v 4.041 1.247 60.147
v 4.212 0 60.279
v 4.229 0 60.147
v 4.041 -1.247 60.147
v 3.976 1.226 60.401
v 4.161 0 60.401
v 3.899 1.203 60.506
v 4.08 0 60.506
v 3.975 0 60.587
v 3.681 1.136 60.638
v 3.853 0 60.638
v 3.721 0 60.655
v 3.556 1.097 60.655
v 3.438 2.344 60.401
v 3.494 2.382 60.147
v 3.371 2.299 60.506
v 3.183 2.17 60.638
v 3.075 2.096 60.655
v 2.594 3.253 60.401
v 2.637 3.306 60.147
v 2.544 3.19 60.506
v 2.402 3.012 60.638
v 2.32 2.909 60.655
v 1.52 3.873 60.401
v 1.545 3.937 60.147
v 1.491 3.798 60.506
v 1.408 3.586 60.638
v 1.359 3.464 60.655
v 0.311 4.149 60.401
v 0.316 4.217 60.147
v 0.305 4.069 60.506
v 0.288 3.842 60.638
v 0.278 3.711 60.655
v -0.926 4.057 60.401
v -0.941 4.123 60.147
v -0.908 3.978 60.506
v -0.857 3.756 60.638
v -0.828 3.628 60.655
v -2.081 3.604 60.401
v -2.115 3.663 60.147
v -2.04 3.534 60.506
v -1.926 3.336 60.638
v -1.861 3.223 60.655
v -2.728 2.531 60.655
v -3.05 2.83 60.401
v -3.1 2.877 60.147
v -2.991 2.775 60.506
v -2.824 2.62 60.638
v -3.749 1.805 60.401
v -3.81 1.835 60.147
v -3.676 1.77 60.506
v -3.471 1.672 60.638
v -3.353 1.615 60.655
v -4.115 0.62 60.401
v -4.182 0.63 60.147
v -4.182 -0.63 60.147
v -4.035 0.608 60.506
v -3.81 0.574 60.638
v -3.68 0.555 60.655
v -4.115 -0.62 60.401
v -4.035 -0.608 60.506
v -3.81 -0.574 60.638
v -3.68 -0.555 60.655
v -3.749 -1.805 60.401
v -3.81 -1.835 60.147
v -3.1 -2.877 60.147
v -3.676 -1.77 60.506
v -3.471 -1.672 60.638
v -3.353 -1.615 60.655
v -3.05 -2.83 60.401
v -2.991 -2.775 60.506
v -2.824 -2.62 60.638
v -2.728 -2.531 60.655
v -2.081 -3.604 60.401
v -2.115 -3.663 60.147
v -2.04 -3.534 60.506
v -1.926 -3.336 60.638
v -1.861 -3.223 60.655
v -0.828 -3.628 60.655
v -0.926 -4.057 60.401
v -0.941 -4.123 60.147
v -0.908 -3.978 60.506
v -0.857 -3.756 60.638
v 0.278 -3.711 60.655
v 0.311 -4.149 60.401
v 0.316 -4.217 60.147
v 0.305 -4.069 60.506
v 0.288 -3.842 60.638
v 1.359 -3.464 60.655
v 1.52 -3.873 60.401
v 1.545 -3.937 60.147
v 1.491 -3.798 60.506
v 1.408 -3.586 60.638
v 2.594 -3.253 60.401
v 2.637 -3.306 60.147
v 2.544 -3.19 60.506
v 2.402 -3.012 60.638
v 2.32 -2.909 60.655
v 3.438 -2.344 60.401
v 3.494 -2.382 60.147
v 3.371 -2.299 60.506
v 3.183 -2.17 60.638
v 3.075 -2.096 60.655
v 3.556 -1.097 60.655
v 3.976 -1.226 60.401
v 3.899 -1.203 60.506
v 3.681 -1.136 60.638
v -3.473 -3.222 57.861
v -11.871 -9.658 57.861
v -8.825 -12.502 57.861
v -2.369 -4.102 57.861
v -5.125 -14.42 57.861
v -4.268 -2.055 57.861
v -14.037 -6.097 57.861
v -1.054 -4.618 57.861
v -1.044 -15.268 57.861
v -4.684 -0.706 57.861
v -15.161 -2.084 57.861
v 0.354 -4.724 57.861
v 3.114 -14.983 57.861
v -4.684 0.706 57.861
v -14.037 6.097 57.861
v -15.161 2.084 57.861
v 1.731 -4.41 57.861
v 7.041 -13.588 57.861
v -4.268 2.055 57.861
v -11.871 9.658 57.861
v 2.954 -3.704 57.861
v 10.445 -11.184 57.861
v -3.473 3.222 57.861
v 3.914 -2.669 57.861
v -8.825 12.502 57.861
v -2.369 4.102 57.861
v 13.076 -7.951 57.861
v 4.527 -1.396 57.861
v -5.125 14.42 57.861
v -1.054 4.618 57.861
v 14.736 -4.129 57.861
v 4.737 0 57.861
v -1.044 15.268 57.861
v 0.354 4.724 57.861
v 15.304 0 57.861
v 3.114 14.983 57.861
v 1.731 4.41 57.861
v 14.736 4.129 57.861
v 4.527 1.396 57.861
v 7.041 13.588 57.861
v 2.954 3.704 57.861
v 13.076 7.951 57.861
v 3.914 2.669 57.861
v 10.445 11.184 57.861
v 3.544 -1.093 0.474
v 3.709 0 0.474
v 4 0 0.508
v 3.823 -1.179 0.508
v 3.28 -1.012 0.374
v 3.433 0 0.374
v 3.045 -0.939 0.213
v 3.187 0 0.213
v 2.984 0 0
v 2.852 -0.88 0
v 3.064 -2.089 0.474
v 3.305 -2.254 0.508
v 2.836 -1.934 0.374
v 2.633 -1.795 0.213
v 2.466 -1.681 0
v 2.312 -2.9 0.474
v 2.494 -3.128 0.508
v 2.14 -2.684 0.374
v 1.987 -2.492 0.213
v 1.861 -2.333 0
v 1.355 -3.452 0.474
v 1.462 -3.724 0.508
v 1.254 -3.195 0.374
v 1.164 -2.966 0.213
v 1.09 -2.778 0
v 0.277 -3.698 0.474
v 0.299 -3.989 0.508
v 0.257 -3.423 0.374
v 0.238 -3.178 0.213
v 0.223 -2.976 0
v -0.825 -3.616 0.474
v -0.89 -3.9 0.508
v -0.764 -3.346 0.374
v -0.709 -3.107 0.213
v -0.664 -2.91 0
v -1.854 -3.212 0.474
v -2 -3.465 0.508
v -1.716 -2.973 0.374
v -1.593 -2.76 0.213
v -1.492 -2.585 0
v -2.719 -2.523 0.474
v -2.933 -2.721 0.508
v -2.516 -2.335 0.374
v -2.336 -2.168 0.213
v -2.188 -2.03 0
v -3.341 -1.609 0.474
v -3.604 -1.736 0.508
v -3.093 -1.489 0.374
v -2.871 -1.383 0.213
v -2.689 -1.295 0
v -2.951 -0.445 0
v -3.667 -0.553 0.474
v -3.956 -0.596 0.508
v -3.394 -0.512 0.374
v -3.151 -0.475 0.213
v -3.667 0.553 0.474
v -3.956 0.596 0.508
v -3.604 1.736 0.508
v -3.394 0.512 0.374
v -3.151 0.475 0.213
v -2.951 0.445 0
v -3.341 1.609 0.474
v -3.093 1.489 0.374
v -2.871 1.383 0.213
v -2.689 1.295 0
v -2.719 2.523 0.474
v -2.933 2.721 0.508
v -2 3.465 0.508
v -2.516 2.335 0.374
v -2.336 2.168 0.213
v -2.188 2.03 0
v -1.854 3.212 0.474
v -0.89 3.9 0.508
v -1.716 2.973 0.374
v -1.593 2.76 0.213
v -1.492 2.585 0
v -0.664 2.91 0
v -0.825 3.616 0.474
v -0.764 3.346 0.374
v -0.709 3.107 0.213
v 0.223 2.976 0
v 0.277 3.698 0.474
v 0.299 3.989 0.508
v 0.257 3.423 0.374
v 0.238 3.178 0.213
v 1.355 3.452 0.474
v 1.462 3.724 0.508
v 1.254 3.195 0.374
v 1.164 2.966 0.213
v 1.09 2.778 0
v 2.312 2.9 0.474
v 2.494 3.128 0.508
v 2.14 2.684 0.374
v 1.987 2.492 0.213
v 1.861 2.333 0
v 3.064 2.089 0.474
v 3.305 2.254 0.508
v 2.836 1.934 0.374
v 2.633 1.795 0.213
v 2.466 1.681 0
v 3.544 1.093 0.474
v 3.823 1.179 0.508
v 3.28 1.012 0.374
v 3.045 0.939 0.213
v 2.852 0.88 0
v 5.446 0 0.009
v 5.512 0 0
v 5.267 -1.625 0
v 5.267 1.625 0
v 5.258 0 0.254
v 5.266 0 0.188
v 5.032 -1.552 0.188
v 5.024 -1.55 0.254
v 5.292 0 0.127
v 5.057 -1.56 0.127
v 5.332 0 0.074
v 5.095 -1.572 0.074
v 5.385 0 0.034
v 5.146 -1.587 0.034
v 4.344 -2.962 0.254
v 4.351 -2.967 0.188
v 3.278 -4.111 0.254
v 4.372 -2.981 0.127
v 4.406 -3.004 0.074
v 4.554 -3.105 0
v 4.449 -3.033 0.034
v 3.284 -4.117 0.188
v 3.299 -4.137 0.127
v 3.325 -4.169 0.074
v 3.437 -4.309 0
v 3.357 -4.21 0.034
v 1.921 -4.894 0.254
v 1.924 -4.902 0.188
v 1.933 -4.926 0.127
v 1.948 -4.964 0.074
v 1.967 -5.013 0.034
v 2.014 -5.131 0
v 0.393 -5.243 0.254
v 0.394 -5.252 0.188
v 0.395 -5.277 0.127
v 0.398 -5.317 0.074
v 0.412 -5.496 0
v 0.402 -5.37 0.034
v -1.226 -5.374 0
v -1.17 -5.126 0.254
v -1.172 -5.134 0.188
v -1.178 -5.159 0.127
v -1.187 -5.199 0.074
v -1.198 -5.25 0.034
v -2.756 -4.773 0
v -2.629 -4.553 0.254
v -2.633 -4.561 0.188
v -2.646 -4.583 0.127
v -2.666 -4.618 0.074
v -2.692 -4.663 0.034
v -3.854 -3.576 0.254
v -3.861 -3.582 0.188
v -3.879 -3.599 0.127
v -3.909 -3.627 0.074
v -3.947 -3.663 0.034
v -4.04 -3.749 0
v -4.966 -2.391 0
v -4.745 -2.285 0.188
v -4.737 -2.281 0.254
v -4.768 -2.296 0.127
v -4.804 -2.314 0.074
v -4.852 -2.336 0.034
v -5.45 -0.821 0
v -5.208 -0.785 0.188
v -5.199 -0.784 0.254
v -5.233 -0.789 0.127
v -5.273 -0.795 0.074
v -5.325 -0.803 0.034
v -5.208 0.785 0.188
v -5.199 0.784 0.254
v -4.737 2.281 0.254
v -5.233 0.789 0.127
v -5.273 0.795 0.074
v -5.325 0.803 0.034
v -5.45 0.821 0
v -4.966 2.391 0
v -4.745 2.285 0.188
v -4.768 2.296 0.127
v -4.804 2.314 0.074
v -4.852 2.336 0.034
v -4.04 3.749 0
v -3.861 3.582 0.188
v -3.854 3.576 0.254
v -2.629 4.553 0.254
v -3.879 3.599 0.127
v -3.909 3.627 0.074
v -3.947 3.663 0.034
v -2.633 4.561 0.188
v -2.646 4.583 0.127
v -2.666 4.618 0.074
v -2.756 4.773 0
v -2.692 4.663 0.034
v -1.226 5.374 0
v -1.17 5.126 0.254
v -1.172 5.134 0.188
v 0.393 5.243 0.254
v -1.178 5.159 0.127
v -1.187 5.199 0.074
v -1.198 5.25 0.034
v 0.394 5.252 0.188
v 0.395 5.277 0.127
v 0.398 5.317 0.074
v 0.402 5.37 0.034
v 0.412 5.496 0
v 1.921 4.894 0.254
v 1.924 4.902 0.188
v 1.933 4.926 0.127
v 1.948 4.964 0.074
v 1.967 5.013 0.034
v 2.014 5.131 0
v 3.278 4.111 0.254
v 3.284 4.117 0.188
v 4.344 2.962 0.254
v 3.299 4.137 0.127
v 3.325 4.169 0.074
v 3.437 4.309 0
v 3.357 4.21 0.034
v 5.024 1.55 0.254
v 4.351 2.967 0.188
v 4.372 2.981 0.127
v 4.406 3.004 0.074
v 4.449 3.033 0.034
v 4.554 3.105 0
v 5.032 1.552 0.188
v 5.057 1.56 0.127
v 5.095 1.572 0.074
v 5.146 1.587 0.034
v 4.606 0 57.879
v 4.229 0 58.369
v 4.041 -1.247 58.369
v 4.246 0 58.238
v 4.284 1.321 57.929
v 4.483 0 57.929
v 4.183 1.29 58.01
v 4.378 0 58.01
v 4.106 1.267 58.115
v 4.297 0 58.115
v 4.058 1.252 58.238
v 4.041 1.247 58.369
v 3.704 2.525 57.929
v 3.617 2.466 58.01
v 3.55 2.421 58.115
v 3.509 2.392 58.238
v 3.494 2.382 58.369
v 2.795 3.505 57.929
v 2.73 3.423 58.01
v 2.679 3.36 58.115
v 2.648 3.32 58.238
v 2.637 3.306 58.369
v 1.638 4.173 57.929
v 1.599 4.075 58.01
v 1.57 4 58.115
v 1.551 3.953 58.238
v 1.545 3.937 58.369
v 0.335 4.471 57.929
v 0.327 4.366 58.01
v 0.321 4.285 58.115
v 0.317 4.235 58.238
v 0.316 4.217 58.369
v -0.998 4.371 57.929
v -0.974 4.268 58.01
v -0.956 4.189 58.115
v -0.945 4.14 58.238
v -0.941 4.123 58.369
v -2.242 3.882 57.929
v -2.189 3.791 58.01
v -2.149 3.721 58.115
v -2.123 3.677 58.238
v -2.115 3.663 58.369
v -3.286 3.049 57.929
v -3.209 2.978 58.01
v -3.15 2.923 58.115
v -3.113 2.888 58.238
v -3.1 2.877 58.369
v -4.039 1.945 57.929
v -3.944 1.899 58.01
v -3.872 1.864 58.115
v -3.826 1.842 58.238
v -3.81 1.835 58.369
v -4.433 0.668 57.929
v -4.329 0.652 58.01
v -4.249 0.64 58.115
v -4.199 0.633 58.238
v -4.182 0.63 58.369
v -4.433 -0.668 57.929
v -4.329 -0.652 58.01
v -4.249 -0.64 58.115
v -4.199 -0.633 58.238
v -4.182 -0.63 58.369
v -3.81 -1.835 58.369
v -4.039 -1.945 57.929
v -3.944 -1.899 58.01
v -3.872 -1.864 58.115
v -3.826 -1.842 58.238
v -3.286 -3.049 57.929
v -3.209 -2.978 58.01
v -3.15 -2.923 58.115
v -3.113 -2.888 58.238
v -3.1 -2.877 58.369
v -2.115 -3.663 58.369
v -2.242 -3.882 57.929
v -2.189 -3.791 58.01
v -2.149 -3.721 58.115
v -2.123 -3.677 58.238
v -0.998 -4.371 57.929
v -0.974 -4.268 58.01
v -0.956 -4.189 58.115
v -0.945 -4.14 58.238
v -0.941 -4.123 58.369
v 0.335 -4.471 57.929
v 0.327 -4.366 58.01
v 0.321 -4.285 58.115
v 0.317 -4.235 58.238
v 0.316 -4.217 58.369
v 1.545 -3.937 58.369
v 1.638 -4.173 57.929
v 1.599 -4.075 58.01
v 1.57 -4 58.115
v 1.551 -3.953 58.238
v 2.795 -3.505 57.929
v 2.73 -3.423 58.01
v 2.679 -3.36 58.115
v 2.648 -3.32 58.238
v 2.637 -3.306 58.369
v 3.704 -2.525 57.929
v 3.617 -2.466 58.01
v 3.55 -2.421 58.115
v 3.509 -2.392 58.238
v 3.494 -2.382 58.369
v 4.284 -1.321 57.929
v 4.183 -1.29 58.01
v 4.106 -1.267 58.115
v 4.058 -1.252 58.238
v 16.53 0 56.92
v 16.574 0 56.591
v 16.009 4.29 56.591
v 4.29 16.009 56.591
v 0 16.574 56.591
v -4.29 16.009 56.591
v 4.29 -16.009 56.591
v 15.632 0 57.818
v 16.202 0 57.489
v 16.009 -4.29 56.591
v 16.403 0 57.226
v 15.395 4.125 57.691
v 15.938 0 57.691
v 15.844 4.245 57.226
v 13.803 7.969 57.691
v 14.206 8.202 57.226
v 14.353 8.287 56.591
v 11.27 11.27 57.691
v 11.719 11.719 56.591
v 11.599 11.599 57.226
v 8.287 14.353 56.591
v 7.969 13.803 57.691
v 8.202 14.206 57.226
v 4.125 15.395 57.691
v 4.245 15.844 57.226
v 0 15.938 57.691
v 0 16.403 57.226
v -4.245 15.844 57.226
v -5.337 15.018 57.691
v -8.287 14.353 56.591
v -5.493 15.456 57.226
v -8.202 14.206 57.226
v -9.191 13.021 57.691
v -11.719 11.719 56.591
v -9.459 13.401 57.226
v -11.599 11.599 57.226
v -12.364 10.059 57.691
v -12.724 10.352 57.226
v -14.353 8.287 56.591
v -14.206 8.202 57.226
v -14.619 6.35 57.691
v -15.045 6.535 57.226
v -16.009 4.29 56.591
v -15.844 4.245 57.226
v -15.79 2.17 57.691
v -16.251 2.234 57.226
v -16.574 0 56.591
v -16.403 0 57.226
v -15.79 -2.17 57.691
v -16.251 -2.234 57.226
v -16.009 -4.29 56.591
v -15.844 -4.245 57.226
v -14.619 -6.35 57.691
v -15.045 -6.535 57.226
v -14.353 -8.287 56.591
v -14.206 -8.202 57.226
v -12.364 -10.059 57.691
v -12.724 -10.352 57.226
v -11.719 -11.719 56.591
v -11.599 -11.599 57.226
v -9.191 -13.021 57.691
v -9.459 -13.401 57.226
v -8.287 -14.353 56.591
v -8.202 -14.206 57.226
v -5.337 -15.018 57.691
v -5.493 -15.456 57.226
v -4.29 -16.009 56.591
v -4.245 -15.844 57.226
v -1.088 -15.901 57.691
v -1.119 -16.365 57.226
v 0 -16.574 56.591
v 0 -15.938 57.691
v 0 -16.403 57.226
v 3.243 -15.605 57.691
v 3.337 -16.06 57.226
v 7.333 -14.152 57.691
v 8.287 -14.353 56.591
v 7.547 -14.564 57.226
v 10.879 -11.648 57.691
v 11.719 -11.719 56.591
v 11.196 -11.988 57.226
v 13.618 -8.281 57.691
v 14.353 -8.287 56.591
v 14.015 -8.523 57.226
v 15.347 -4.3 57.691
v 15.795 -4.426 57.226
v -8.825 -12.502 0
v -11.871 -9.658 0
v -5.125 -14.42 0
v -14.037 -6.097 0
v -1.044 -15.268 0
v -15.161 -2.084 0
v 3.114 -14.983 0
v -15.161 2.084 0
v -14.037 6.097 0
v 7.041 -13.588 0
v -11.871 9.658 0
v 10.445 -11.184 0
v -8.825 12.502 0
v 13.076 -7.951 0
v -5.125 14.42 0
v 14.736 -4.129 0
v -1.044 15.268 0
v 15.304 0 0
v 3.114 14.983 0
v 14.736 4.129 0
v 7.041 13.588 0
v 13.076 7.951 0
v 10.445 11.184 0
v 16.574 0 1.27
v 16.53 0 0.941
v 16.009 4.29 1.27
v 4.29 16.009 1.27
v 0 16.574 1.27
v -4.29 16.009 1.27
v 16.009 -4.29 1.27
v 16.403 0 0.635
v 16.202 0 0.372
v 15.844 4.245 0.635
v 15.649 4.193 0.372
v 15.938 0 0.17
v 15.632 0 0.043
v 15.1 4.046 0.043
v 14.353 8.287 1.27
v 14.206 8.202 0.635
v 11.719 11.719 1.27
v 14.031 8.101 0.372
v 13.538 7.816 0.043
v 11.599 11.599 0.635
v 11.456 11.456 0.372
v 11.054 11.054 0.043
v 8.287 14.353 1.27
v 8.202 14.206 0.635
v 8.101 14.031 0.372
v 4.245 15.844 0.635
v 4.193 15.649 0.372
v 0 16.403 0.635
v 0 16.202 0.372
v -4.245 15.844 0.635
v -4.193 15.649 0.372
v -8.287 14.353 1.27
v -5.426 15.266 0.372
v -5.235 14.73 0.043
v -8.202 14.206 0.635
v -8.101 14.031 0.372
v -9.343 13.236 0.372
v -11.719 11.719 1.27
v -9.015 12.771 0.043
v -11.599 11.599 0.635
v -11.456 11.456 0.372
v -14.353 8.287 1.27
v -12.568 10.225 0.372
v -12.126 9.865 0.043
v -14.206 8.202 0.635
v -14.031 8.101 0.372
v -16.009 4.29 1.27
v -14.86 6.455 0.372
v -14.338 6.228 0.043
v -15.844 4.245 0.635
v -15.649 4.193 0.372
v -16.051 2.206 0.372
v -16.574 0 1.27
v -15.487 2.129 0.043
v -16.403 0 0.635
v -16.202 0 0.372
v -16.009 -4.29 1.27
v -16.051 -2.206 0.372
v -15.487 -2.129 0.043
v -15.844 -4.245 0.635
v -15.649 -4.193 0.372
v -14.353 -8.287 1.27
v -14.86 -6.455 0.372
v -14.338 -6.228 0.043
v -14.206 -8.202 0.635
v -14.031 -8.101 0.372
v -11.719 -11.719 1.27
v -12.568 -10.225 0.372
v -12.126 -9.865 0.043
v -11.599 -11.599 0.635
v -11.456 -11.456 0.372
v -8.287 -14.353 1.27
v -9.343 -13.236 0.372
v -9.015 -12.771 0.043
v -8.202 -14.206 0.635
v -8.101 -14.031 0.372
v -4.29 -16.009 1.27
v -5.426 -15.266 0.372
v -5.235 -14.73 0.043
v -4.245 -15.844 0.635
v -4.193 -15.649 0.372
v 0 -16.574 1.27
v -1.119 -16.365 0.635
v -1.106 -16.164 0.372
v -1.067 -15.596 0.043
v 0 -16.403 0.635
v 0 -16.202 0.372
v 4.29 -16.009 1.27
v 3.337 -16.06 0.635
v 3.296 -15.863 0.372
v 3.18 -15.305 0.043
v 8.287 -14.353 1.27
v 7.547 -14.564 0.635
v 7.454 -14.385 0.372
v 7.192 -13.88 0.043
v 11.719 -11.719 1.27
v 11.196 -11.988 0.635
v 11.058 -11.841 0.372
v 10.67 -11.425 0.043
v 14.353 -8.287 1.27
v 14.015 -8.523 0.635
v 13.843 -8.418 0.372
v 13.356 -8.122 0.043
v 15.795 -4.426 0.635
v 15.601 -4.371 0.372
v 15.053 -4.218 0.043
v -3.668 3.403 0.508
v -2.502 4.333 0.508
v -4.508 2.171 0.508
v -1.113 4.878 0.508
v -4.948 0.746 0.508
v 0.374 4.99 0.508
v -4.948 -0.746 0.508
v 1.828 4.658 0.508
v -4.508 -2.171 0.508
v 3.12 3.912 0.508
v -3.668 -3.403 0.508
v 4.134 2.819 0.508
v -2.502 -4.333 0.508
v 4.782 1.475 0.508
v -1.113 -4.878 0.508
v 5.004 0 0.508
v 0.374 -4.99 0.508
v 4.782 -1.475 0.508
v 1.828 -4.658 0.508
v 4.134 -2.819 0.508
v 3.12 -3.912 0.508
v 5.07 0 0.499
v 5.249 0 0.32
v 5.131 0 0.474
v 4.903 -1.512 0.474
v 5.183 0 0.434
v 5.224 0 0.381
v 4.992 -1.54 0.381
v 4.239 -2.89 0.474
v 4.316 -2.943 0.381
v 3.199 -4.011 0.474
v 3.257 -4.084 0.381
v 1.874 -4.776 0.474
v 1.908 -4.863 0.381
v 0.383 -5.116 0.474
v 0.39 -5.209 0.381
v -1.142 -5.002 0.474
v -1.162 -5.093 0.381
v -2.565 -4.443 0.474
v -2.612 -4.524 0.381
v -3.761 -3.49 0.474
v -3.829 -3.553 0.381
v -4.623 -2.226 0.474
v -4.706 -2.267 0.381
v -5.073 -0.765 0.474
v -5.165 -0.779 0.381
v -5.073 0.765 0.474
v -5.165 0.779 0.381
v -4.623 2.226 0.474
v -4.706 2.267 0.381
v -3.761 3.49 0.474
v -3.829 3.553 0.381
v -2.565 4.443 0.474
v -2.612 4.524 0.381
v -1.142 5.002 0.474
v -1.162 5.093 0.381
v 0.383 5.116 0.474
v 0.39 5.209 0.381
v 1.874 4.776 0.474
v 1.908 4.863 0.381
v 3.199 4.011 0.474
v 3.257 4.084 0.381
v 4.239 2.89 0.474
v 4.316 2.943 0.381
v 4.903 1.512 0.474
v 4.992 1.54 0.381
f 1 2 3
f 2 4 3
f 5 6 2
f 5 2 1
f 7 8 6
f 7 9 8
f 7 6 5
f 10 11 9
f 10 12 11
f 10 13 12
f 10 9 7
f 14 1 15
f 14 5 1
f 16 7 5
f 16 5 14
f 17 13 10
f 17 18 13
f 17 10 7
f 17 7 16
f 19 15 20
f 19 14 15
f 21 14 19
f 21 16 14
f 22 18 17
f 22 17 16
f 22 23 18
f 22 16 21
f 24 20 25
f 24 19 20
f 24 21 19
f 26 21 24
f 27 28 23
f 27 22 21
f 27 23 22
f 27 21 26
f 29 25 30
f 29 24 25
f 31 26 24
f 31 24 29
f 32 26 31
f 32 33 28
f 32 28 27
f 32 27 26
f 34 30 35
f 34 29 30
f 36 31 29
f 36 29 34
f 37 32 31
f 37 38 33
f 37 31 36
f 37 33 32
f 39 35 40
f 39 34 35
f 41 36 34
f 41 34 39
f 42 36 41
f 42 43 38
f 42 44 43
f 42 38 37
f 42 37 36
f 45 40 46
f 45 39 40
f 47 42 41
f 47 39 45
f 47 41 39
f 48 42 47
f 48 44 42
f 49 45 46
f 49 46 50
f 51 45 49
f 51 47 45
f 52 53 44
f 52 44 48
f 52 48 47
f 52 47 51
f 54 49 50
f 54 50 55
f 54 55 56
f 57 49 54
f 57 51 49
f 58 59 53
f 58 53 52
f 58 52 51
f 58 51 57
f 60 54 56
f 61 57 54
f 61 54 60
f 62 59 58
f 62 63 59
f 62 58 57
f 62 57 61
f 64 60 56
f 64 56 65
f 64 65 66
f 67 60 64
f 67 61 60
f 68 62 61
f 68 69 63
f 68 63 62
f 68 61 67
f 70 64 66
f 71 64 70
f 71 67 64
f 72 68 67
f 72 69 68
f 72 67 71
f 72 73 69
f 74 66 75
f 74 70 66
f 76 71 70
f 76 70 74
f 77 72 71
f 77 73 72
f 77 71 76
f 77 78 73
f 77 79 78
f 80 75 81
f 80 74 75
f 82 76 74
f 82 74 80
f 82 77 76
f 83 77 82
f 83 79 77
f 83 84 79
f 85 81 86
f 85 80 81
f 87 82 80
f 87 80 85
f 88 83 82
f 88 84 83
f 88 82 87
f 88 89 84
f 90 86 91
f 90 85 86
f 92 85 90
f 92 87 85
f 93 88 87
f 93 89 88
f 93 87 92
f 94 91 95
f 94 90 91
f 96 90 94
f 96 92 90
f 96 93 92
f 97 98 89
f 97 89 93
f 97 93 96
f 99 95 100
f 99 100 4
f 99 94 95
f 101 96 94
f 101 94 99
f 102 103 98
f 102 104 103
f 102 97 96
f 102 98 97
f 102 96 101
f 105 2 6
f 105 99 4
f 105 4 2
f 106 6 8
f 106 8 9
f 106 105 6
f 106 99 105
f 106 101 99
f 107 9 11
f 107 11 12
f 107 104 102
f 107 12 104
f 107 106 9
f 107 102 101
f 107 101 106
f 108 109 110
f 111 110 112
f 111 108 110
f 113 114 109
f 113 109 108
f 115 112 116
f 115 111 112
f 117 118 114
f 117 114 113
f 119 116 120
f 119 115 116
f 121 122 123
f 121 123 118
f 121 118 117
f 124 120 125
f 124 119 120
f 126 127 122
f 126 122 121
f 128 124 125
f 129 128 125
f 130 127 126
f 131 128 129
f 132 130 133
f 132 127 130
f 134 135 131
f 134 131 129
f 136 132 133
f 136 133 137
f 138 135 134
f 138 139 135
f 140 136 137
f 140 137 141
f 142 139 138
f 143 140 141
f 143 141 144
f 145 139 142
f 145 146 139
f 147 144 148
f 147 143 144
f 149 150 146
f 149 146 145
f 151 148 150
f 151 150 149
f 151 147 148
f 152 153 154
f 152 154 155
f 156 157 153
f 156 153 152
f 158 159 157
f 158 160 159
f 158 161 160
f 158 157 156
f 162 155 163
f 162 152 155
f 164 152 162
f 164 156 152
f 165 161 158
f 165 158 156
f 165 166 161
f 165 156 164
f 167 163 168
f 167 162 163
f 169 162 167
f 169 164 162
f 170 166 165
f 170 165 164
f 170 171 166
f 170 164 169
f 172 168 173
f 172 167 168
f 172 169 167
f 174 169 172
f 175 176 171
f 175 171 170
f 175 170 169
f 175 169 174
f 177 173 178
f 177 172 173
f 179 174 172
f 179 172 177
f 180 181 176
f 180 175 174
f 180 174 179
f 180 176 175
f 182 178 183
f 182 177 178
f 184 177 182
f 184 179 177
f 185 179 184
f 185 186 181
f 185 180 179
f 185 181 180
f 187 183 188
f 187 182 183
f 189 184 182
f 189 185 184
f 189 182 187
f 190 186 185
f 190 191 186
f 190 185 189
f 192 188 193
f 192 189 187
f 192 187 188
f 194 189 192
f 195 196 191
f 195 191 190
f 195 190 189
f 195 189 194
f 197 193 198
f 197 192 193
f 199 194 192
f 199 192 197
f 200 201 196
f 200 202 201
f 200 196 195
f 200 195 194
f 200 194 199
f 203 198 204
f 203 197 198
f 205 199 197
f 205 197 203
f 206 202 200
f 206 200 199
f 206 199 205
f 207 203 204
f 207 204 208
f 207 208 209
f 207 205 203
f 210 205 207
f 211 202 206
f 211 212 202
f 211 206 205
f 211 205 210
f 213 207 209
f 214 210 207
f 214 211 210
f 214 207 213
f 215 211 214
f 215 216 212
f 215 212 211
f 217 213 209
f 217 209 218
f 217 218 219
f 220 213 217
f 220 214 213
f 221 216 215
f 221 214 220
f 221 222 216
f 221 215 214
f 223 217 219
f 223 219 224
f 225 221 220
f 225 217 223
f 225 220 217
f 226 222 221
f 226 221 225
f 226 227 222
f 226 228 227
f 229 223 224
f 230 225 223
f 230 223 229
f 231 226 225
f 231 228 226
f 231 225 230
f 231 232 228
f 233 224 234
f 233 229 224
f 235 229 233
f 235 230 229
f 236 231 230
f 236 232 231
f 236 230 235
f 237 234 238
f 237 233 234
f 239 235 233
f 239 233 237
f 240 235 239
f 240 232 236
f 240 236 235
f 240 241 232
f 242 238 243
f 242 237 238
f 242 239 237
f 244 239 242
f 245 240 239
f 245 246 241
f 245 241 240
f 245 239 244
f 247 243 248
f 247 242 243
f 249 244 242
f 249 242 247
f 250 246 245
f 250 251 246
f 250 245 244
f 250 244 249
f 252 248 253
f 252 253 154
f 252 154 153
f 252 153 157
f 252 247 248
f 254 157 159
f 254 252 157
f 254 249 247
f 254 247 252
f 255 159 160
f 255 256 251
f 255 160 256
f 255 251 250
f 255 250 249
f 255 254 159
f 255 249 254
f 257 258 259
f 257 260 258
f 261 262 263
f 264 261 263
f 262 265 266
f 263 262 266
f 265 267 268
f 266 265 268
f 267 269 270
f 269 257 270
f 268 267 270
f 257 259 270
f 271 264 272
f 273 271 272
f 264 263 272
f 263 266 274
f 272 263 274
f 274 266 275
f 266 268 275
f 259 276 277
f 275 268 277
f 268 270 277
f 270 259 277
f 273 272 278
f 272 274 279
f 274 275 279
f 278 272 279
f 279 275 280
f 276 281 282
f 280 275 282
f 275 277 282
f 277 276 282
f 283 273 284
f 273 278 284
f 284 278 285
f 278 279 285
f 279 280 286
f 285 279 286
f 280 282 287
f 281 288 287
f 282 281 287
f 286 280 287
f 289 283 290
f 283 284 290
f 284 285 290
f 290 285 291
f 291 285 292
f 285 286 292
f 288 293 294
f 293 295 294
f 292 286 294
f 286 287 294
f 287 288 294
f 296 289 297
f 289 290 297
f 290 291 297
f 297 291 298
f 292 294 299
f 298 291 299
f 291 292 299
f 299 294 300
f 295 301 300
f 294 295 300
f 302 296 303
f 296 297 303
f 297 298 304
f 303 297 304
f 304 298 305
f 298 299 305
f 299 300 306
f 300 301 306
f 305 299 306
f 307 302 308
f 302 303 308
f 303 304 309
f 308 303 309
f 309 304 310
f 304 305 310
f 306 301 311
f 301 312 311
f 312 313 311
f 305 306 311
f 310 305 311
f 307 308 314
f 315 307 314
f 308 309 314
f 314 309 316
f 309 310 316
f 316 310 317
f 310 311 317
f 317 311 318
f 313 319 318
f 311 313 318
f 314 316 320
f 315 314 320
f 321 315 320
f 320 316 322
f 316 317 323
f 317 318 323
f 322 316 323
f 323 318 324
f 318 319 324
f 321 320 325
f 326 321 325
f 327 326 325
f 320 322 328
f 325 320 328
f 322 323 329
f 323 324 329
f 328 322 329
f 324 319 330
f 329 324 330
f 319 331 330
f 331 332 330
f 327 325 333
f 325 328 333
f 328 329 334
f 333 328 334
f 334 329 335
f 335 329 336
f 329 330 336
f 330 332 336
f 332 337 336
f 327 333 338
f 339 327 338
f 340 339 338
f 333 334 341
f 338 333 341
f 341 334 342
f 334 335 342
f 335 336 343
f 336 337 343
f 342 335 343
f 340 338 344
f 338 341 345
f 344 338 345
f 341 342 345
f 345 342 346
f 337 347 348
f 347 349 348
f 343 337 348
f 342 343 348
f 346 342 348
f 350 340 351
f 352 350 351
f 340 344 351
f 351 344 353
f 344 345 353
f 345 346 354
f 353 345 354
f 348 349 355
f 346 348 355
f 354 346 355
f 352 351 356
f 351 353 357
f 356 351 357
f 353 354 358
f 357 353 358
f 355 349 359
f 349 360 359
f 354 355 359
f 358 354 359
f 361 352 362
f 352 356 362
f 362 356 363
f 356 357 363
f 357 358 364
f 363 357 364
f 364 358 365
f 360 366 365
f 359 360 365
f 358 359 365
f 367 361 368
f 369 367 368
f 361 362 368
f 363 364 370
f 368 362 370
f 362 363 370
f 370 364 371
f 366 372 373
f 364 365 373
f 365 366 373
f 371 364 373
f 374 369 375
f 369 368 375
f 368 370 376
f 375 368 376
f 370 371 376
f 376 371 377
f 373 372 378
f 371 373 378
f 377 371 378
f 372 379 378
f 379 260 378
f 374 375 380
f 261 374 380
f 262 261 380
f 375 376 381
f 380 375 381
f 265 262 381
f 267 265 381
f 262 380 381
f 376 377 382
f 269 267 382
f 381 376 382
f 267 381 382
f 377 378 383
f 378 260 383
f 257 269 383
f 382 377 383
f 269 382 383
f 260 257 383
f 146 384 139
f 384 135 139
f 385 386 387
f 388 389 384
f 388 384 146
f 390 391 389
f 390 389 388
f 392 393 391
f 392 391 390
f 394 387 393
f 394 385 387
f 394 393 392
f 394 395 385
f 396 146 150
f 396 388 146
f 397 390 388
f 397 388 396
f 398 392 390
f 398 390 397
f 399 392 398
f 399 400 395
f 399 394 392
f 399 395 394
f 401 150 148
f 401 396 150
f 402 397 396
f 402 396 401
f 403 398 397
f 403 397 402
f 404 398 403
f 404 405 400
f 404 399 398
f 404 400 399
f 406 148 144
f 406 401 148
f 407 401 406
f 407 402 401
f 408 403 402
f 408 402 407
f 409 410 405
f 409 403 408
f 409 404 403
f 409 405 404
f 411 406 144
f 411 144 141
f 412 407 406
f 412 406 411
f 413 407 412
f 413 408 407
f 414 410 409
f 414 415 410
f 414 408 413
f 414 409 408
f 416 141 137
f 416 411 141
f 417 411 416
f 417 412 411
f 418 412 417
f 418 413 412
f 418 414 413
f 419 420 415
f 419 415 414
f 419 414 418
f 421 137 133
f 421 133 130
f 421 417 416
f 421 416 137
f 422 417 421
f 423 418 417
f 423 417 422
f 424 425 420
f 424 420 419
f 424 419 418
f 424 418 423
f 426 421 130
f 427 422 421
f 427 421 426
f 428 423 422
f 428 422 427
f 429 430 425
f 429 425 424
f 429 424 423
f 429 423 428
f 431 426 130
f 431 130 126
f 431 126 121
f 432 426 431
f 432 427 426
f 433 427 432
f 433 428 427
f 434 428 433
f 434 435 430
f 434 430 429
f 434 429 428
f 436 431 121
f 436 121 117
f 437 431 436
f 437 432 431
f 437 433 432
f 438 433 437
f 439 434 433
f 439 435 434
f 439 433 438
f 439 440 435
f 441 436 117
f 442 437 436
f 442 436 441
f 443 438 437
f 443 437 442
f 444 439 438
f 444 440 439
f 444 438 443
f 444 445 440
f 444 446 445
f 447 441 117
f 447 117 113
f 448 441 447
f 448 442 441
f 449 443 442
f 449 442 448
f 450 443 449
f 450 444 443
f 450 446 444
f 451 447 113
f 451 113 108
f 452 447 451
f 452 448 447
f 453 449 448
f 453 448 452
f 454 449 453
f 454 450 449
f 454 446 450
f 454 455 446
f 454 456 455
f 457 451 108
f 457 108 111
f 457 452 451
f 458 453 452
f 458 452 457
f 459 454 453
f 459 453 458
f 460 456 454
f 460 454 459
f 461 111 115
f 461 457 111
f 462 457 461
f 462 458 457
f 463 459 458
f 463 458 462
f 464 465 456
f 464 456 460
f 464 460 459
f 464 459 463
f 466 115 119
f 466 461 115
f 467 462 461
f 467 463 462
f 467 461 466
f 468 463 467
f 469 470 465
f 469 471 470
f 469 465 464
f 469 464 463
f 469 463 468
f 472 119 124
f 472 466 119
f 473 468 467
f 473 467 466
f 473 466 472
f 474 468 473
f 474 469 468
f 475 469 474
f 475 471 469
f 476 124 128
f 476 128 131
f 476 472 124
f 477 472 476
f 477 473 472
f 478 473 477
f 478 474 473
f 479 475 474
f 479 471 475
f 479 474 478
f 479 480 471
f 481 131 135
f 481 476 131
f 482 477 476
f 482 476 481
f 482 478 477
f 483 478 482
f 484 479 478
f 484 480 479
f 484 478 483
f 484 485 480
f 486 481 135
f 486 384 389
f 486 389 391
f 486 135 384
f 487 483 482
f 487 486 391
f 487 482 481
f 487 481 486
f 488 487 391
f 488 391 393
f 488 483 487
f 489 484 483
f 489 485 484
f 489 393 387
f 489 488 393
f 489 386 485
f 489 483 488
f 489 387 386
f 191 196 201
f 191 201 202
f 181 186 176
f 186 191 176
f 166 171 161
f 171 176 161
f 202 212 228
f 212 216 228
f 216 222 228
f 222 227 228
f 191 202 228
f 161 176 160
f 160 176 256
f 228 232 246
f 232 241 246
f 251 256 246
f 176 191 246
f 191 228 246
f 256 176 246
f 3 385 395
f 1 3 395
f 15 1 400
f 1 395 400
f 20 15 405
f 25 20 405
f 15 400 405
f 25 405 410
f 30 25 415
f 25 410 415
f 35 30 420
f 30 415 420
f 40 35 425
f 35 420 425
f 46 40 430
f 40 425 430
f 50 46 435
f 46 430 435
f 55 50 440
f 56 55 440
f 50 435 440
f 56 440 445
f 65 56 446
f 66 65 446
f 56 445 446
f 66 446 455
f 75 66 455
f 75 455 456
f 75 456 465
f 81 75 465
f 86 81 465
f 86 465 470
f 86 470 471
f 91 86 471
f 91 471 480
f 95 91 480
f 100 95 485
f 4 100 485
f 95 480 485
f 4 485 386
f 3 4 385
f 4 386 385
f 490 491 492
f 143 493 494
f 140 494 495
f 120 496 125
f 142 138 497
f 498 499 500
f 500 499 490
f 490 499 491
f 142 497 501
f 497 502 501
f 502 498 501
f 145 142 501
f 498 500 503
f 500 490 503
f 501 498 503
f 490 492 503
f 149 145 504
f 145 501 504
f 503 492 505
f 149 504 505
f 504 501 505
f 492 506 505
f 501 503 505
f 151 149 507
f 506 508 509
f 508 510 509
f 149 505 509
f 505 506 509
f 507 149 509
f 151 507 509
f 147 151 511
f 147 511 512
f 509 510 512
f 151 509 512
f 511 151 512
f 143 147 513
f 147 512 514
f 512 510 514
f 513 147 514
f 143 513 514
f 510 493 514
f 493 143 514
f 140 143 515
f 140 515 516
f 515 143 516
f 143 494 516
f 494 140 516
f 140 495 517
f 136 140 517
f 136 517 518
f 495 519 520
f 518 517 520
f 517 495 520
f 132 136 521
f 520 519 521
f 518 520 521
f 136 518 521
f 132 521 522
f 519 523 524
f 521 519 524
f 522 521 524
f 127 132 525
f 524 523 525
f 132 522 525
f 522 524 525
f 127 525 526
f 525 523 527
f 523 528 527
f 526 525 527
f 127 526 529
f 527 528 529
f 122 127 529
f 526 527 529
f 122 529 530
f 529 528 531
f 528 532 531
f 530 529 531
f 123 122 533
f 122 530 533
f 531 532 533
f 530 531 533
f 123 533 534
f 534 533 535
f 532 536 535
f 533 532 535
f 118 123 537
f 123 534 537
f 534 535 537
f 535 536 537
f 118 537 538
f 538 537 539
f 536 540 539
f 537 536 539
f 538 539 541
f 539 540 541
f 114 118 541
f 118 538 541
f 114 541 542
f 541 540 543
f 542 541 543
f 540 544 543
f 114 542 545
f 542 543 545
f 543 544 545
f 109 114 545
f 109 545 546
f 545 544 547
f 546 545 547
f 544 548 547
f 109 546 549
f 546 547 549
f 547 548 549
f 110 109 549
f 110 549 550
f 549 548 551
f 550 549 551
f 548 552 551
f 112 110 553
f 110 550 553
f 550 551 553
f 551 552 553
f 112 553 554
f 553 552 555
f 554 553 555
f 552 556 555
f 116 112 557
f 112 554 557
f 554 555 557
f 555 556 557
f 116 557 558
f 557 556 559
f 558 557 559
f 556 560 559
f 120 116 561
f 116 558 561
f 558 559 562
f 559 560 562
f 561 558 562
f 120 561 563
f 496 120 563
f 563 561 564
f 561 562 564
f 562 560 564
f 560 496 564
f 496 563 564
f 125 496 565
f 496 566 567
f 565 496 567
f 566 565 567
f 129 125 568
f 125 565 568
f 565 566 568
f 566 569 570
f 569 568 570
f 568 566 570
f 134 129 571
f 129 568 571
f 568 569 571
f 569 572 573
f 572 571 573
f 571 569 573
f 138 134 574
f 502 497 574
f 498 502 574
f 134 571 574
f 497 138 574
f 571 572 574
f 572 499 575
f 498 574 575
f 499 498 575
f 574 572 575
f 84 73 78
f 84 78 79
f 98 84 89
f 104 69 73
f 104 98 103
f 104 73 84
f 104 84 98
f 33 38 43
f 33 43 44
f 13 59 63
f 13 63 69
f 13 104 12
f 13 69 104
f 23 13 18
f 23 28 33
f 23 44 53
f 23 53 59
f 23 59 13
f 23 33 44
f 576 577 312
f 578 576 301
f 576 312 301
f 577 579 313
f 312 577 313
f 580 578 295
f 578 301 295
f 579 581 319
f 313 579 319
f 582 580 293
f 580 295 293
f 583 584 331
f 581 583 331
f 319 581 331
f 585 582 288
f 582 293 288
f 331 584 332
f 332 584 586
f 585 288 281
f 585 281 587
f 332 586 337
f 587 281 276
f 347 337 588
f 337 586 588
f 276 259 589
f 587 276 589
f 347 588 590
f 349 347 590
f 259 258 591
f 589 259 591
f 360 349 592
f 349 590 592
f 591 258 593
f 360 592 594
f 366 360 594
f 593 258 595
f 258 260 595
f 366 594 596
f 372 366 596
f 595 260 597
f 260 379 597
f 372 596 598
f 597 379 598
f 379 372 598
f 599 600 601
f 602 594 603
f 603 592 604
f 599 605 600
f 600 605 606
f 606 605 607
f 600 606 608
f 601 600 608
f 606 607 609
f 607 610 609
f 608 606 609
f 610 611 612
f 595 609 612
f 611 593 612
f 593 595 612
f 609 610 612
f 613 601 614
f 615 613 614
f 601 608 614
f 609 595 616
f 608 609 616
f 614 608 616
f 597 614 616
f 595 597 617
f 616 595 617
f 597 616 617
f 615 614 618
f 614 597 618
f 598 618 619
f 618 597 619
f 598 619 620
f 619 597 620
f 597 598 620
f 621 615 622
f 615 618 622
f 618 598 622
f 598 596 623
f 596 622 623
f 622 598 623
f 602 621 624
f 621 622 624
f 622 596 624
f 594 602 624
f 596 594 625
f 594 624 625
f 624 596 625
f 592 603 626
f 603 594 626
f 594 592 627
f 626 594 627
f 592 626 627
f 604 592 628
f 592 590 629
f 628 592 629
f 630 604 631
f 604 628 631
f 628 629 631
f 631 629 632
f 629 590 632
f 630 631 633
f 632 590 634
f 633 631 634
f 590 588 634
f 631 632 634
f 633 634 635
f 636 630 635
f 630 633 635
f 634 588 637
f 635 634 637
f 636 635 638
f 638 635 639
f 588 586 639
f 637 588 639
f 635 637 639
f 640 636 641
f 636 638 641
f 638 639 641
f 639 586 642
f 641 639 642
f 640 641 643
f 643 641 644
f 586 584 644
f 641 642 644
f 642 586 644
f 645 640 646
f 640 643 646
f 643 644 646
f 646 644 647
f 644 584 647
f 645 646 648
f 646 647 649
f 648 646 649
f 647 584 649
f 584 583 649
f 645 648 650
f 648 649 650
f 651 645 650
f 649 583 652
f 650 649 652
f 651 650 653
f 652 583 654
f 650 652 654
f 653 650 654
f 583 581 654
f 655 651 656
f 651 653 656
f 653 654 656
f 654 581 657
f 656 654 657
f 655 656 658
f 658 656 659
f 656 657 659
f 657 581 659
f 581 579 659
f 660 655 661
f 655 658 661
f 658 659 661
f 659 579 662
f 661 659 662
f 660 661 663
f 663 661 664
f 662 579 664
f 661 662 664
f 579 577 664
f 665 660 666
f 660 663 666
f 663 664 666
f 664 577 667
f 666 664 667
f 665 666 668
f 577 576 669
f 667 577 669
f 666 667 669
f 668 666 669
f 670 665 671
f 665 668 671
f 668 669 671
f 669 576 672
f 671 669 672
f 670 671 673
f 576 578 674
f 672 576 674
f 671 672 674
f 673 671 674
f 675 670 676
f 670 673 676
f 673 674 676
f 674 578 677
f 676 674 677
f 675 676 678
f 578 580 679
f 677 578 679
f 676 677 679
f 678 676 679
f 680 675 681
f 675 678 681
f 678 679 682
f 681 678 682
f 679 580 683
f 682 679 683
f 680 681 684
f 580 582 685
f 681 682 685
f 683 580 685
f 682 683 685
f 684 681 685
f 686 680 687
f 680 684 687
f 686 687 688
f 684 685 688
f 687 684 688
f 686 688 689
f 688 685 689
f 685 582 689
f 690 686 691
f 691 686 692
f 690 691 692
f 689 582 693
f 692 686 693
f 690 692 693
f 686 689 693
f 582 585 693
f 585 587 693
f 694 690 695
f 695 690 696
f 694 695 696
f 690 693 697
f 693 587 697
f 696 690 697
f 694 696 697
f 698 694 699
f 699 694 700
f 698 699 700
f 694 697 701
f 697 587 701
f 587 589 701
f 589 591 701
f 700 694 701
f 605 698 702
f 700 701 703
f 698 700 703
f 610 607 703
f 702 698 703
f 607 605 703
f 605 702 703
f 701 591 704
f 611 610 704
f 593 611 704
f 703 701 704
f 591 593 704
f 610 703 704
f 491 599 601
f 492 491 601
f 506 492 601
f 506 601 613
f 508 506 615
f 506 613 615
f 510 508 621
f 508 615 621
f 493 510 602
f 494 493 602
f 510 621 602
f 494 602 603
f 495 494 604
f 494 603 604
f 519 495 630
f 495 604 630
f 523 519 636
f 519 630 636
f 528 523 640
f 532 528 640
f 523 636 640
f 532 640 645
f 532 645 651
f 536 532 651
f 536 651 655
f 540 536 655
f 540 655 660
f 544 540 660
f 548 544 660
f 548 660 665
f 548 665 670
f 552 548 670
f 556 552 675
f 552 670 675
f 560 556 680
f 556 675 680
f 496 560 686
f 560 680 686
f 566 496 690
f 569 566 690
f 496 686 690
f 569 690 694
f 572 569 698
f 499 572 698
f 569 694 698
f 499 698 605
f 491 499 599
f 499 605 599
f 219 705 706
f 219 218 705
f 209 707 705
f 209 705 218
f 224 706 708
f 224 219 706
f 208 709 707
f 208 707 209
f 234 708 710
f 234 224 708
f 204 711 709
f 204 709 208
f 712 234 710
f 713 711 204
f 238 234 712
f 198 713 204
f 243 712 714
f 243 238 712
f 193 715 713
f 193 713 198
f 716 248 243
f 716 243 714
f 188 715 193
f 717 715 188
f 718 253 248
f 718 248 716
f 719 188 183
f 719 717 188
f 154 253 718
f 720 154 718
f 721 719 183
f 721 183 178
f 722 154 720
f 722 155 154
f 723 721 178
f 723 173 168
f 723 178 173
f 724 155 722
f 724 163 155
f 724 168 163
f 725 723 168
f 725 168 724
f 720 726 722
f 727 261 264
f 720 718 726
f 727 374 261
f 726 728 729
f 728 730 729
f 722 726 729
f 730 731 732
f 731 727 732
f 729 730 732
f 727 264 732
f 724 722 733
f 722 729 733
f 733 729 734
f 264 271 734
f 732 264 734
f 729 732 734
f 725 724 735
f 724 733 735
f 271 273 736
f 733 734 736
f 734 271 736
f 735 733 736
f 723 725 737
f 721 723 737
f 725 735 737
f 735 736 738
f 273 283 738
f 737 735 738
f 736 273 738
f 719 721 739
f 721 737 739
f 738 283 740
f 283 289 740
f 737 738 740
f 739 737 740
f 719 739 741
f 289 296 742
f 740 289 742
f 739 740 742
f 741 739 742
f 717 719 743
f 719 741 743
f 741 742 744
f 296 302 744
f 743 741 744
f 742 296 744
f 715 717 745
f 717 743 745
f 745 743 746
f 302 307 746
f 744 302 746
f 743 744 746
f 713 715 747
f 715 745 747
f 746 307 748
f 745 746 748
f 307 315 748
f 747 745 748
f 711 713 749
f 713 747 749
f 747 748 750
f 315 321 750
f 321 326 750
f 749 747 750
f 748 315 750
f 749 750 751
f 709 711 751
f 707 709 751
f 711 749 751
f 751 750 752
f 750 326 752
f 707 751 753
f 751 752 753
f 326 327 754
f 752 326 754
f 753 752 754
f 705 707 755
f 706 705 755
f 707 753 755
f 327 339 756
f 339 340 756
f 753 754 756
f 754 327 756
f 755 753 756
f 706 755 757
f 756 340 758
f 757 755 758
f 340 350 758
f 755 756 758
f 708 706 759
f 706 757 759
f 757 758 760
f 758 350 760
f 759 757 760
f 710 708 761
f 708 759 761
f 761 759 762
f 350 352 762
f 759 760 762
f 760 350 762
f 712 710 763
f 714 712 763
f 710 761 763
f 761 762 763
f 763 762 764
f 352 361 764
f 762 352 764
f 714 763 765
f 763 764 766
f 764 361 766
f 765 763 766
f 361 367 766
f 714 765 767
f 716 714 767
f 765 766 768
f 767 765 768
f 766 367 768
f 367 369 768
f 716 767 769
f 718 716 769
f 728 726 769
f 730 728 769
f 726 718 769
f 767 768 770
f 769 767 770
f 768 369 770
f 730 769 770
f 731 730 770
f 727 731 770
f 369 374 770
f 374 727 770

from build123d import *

# Parameters (mm, degrees)
F0_R     = 16.5735
F1_DEPTH = 57.8612
F2_R     = 4.2291
F3_DEPTH = 2.794
F4_R     = 0.508
F5_R     = 1.27
F6_R     = 5.2578
F6_R_2   = 2.9845
F7_DEPTH = 0.508
F9_R     = 0.25399


# Not quite as in the source:
# - a fillet or chamfer that OpenCascade refuses, or shapes differently, is made with other operations: its cross-section is extruded or revolved along the edge and cut away or added
# - a fillet or chamfer is up to 0.001 mm smaller than in the source, because OpenCascade refuses the exact size


with BuildPart() as f1:
    # F0 (on Top) → F1 (new body)
    with BuildSketch(Plane.XY):
        Circle(F0_R)
    extrude(amount=F1_DEPTH)

    # F2 (on face) → F3 (join)
    with BuildSketch(Plane.XY.offset(57.8612)):
        Circle(F2_R)
    extrude(amount=F3_DEPTH)

    # F4
    f4_edges = [f1.edges().sort_by_distance(p)[0] for p in [
        (-4.2291, 0, 60.6552),
        (-4.2291, 0, 57.8612),
    ]]
    fillet(f4_edges, radius=F4_R)

    # F5
    f5_edges = [f1.edges().sort_by_distance(p)[0] for p in [
        (-16.5735, 0, 57.8612),
        (-16.5735, 0, 0),
    ]]
    fillet(f5_edges, radius=F5_R)

    # F6 (on face) → F7 (cut)
    with BuildSketch(Plane(origin=(0, 0, 0), x_dir=(1, 0, 0), z_dir=(0, 0, -1))):
        Circle(F6_R)
        Circle(F6_R_2, mode=Mode.SUBTRACT)
    extrude(amount=-F7_DEPTH, mode=Mode.SUBTRACT)

    # F8: fillet of radius 1.27 on 1 edges, made by hand

    # F8_s1 → F8_t2 (revolve)
    with BuildSketch(Plane.XZ):
        with BuildLine():
            ThreePointArc((4.0005, 0.508), (3.4325387337, 0.3739225326), (2.9845, 0))
            Line((2.9845, 0), (2.9845, 0.508))
            Line((2.9845, 0.508), (4.0005, 0.508))
        make_face()
    revolve(axis=Axis((0, 0, 0.508), (0, 0, -1)))

    # F9 (radius 0.254 in the source; OpenCascade refuses exactly that, so slightly less here)
    f9_edges = [f1.edges().sort_by_distance(p)[0] for p in [
        (-5.2578, 0, 0.508),
        (-5.2578, 0, 0),
    ]]
    fillet(f9_edges, radius=F9_R)


solid = f1.part
